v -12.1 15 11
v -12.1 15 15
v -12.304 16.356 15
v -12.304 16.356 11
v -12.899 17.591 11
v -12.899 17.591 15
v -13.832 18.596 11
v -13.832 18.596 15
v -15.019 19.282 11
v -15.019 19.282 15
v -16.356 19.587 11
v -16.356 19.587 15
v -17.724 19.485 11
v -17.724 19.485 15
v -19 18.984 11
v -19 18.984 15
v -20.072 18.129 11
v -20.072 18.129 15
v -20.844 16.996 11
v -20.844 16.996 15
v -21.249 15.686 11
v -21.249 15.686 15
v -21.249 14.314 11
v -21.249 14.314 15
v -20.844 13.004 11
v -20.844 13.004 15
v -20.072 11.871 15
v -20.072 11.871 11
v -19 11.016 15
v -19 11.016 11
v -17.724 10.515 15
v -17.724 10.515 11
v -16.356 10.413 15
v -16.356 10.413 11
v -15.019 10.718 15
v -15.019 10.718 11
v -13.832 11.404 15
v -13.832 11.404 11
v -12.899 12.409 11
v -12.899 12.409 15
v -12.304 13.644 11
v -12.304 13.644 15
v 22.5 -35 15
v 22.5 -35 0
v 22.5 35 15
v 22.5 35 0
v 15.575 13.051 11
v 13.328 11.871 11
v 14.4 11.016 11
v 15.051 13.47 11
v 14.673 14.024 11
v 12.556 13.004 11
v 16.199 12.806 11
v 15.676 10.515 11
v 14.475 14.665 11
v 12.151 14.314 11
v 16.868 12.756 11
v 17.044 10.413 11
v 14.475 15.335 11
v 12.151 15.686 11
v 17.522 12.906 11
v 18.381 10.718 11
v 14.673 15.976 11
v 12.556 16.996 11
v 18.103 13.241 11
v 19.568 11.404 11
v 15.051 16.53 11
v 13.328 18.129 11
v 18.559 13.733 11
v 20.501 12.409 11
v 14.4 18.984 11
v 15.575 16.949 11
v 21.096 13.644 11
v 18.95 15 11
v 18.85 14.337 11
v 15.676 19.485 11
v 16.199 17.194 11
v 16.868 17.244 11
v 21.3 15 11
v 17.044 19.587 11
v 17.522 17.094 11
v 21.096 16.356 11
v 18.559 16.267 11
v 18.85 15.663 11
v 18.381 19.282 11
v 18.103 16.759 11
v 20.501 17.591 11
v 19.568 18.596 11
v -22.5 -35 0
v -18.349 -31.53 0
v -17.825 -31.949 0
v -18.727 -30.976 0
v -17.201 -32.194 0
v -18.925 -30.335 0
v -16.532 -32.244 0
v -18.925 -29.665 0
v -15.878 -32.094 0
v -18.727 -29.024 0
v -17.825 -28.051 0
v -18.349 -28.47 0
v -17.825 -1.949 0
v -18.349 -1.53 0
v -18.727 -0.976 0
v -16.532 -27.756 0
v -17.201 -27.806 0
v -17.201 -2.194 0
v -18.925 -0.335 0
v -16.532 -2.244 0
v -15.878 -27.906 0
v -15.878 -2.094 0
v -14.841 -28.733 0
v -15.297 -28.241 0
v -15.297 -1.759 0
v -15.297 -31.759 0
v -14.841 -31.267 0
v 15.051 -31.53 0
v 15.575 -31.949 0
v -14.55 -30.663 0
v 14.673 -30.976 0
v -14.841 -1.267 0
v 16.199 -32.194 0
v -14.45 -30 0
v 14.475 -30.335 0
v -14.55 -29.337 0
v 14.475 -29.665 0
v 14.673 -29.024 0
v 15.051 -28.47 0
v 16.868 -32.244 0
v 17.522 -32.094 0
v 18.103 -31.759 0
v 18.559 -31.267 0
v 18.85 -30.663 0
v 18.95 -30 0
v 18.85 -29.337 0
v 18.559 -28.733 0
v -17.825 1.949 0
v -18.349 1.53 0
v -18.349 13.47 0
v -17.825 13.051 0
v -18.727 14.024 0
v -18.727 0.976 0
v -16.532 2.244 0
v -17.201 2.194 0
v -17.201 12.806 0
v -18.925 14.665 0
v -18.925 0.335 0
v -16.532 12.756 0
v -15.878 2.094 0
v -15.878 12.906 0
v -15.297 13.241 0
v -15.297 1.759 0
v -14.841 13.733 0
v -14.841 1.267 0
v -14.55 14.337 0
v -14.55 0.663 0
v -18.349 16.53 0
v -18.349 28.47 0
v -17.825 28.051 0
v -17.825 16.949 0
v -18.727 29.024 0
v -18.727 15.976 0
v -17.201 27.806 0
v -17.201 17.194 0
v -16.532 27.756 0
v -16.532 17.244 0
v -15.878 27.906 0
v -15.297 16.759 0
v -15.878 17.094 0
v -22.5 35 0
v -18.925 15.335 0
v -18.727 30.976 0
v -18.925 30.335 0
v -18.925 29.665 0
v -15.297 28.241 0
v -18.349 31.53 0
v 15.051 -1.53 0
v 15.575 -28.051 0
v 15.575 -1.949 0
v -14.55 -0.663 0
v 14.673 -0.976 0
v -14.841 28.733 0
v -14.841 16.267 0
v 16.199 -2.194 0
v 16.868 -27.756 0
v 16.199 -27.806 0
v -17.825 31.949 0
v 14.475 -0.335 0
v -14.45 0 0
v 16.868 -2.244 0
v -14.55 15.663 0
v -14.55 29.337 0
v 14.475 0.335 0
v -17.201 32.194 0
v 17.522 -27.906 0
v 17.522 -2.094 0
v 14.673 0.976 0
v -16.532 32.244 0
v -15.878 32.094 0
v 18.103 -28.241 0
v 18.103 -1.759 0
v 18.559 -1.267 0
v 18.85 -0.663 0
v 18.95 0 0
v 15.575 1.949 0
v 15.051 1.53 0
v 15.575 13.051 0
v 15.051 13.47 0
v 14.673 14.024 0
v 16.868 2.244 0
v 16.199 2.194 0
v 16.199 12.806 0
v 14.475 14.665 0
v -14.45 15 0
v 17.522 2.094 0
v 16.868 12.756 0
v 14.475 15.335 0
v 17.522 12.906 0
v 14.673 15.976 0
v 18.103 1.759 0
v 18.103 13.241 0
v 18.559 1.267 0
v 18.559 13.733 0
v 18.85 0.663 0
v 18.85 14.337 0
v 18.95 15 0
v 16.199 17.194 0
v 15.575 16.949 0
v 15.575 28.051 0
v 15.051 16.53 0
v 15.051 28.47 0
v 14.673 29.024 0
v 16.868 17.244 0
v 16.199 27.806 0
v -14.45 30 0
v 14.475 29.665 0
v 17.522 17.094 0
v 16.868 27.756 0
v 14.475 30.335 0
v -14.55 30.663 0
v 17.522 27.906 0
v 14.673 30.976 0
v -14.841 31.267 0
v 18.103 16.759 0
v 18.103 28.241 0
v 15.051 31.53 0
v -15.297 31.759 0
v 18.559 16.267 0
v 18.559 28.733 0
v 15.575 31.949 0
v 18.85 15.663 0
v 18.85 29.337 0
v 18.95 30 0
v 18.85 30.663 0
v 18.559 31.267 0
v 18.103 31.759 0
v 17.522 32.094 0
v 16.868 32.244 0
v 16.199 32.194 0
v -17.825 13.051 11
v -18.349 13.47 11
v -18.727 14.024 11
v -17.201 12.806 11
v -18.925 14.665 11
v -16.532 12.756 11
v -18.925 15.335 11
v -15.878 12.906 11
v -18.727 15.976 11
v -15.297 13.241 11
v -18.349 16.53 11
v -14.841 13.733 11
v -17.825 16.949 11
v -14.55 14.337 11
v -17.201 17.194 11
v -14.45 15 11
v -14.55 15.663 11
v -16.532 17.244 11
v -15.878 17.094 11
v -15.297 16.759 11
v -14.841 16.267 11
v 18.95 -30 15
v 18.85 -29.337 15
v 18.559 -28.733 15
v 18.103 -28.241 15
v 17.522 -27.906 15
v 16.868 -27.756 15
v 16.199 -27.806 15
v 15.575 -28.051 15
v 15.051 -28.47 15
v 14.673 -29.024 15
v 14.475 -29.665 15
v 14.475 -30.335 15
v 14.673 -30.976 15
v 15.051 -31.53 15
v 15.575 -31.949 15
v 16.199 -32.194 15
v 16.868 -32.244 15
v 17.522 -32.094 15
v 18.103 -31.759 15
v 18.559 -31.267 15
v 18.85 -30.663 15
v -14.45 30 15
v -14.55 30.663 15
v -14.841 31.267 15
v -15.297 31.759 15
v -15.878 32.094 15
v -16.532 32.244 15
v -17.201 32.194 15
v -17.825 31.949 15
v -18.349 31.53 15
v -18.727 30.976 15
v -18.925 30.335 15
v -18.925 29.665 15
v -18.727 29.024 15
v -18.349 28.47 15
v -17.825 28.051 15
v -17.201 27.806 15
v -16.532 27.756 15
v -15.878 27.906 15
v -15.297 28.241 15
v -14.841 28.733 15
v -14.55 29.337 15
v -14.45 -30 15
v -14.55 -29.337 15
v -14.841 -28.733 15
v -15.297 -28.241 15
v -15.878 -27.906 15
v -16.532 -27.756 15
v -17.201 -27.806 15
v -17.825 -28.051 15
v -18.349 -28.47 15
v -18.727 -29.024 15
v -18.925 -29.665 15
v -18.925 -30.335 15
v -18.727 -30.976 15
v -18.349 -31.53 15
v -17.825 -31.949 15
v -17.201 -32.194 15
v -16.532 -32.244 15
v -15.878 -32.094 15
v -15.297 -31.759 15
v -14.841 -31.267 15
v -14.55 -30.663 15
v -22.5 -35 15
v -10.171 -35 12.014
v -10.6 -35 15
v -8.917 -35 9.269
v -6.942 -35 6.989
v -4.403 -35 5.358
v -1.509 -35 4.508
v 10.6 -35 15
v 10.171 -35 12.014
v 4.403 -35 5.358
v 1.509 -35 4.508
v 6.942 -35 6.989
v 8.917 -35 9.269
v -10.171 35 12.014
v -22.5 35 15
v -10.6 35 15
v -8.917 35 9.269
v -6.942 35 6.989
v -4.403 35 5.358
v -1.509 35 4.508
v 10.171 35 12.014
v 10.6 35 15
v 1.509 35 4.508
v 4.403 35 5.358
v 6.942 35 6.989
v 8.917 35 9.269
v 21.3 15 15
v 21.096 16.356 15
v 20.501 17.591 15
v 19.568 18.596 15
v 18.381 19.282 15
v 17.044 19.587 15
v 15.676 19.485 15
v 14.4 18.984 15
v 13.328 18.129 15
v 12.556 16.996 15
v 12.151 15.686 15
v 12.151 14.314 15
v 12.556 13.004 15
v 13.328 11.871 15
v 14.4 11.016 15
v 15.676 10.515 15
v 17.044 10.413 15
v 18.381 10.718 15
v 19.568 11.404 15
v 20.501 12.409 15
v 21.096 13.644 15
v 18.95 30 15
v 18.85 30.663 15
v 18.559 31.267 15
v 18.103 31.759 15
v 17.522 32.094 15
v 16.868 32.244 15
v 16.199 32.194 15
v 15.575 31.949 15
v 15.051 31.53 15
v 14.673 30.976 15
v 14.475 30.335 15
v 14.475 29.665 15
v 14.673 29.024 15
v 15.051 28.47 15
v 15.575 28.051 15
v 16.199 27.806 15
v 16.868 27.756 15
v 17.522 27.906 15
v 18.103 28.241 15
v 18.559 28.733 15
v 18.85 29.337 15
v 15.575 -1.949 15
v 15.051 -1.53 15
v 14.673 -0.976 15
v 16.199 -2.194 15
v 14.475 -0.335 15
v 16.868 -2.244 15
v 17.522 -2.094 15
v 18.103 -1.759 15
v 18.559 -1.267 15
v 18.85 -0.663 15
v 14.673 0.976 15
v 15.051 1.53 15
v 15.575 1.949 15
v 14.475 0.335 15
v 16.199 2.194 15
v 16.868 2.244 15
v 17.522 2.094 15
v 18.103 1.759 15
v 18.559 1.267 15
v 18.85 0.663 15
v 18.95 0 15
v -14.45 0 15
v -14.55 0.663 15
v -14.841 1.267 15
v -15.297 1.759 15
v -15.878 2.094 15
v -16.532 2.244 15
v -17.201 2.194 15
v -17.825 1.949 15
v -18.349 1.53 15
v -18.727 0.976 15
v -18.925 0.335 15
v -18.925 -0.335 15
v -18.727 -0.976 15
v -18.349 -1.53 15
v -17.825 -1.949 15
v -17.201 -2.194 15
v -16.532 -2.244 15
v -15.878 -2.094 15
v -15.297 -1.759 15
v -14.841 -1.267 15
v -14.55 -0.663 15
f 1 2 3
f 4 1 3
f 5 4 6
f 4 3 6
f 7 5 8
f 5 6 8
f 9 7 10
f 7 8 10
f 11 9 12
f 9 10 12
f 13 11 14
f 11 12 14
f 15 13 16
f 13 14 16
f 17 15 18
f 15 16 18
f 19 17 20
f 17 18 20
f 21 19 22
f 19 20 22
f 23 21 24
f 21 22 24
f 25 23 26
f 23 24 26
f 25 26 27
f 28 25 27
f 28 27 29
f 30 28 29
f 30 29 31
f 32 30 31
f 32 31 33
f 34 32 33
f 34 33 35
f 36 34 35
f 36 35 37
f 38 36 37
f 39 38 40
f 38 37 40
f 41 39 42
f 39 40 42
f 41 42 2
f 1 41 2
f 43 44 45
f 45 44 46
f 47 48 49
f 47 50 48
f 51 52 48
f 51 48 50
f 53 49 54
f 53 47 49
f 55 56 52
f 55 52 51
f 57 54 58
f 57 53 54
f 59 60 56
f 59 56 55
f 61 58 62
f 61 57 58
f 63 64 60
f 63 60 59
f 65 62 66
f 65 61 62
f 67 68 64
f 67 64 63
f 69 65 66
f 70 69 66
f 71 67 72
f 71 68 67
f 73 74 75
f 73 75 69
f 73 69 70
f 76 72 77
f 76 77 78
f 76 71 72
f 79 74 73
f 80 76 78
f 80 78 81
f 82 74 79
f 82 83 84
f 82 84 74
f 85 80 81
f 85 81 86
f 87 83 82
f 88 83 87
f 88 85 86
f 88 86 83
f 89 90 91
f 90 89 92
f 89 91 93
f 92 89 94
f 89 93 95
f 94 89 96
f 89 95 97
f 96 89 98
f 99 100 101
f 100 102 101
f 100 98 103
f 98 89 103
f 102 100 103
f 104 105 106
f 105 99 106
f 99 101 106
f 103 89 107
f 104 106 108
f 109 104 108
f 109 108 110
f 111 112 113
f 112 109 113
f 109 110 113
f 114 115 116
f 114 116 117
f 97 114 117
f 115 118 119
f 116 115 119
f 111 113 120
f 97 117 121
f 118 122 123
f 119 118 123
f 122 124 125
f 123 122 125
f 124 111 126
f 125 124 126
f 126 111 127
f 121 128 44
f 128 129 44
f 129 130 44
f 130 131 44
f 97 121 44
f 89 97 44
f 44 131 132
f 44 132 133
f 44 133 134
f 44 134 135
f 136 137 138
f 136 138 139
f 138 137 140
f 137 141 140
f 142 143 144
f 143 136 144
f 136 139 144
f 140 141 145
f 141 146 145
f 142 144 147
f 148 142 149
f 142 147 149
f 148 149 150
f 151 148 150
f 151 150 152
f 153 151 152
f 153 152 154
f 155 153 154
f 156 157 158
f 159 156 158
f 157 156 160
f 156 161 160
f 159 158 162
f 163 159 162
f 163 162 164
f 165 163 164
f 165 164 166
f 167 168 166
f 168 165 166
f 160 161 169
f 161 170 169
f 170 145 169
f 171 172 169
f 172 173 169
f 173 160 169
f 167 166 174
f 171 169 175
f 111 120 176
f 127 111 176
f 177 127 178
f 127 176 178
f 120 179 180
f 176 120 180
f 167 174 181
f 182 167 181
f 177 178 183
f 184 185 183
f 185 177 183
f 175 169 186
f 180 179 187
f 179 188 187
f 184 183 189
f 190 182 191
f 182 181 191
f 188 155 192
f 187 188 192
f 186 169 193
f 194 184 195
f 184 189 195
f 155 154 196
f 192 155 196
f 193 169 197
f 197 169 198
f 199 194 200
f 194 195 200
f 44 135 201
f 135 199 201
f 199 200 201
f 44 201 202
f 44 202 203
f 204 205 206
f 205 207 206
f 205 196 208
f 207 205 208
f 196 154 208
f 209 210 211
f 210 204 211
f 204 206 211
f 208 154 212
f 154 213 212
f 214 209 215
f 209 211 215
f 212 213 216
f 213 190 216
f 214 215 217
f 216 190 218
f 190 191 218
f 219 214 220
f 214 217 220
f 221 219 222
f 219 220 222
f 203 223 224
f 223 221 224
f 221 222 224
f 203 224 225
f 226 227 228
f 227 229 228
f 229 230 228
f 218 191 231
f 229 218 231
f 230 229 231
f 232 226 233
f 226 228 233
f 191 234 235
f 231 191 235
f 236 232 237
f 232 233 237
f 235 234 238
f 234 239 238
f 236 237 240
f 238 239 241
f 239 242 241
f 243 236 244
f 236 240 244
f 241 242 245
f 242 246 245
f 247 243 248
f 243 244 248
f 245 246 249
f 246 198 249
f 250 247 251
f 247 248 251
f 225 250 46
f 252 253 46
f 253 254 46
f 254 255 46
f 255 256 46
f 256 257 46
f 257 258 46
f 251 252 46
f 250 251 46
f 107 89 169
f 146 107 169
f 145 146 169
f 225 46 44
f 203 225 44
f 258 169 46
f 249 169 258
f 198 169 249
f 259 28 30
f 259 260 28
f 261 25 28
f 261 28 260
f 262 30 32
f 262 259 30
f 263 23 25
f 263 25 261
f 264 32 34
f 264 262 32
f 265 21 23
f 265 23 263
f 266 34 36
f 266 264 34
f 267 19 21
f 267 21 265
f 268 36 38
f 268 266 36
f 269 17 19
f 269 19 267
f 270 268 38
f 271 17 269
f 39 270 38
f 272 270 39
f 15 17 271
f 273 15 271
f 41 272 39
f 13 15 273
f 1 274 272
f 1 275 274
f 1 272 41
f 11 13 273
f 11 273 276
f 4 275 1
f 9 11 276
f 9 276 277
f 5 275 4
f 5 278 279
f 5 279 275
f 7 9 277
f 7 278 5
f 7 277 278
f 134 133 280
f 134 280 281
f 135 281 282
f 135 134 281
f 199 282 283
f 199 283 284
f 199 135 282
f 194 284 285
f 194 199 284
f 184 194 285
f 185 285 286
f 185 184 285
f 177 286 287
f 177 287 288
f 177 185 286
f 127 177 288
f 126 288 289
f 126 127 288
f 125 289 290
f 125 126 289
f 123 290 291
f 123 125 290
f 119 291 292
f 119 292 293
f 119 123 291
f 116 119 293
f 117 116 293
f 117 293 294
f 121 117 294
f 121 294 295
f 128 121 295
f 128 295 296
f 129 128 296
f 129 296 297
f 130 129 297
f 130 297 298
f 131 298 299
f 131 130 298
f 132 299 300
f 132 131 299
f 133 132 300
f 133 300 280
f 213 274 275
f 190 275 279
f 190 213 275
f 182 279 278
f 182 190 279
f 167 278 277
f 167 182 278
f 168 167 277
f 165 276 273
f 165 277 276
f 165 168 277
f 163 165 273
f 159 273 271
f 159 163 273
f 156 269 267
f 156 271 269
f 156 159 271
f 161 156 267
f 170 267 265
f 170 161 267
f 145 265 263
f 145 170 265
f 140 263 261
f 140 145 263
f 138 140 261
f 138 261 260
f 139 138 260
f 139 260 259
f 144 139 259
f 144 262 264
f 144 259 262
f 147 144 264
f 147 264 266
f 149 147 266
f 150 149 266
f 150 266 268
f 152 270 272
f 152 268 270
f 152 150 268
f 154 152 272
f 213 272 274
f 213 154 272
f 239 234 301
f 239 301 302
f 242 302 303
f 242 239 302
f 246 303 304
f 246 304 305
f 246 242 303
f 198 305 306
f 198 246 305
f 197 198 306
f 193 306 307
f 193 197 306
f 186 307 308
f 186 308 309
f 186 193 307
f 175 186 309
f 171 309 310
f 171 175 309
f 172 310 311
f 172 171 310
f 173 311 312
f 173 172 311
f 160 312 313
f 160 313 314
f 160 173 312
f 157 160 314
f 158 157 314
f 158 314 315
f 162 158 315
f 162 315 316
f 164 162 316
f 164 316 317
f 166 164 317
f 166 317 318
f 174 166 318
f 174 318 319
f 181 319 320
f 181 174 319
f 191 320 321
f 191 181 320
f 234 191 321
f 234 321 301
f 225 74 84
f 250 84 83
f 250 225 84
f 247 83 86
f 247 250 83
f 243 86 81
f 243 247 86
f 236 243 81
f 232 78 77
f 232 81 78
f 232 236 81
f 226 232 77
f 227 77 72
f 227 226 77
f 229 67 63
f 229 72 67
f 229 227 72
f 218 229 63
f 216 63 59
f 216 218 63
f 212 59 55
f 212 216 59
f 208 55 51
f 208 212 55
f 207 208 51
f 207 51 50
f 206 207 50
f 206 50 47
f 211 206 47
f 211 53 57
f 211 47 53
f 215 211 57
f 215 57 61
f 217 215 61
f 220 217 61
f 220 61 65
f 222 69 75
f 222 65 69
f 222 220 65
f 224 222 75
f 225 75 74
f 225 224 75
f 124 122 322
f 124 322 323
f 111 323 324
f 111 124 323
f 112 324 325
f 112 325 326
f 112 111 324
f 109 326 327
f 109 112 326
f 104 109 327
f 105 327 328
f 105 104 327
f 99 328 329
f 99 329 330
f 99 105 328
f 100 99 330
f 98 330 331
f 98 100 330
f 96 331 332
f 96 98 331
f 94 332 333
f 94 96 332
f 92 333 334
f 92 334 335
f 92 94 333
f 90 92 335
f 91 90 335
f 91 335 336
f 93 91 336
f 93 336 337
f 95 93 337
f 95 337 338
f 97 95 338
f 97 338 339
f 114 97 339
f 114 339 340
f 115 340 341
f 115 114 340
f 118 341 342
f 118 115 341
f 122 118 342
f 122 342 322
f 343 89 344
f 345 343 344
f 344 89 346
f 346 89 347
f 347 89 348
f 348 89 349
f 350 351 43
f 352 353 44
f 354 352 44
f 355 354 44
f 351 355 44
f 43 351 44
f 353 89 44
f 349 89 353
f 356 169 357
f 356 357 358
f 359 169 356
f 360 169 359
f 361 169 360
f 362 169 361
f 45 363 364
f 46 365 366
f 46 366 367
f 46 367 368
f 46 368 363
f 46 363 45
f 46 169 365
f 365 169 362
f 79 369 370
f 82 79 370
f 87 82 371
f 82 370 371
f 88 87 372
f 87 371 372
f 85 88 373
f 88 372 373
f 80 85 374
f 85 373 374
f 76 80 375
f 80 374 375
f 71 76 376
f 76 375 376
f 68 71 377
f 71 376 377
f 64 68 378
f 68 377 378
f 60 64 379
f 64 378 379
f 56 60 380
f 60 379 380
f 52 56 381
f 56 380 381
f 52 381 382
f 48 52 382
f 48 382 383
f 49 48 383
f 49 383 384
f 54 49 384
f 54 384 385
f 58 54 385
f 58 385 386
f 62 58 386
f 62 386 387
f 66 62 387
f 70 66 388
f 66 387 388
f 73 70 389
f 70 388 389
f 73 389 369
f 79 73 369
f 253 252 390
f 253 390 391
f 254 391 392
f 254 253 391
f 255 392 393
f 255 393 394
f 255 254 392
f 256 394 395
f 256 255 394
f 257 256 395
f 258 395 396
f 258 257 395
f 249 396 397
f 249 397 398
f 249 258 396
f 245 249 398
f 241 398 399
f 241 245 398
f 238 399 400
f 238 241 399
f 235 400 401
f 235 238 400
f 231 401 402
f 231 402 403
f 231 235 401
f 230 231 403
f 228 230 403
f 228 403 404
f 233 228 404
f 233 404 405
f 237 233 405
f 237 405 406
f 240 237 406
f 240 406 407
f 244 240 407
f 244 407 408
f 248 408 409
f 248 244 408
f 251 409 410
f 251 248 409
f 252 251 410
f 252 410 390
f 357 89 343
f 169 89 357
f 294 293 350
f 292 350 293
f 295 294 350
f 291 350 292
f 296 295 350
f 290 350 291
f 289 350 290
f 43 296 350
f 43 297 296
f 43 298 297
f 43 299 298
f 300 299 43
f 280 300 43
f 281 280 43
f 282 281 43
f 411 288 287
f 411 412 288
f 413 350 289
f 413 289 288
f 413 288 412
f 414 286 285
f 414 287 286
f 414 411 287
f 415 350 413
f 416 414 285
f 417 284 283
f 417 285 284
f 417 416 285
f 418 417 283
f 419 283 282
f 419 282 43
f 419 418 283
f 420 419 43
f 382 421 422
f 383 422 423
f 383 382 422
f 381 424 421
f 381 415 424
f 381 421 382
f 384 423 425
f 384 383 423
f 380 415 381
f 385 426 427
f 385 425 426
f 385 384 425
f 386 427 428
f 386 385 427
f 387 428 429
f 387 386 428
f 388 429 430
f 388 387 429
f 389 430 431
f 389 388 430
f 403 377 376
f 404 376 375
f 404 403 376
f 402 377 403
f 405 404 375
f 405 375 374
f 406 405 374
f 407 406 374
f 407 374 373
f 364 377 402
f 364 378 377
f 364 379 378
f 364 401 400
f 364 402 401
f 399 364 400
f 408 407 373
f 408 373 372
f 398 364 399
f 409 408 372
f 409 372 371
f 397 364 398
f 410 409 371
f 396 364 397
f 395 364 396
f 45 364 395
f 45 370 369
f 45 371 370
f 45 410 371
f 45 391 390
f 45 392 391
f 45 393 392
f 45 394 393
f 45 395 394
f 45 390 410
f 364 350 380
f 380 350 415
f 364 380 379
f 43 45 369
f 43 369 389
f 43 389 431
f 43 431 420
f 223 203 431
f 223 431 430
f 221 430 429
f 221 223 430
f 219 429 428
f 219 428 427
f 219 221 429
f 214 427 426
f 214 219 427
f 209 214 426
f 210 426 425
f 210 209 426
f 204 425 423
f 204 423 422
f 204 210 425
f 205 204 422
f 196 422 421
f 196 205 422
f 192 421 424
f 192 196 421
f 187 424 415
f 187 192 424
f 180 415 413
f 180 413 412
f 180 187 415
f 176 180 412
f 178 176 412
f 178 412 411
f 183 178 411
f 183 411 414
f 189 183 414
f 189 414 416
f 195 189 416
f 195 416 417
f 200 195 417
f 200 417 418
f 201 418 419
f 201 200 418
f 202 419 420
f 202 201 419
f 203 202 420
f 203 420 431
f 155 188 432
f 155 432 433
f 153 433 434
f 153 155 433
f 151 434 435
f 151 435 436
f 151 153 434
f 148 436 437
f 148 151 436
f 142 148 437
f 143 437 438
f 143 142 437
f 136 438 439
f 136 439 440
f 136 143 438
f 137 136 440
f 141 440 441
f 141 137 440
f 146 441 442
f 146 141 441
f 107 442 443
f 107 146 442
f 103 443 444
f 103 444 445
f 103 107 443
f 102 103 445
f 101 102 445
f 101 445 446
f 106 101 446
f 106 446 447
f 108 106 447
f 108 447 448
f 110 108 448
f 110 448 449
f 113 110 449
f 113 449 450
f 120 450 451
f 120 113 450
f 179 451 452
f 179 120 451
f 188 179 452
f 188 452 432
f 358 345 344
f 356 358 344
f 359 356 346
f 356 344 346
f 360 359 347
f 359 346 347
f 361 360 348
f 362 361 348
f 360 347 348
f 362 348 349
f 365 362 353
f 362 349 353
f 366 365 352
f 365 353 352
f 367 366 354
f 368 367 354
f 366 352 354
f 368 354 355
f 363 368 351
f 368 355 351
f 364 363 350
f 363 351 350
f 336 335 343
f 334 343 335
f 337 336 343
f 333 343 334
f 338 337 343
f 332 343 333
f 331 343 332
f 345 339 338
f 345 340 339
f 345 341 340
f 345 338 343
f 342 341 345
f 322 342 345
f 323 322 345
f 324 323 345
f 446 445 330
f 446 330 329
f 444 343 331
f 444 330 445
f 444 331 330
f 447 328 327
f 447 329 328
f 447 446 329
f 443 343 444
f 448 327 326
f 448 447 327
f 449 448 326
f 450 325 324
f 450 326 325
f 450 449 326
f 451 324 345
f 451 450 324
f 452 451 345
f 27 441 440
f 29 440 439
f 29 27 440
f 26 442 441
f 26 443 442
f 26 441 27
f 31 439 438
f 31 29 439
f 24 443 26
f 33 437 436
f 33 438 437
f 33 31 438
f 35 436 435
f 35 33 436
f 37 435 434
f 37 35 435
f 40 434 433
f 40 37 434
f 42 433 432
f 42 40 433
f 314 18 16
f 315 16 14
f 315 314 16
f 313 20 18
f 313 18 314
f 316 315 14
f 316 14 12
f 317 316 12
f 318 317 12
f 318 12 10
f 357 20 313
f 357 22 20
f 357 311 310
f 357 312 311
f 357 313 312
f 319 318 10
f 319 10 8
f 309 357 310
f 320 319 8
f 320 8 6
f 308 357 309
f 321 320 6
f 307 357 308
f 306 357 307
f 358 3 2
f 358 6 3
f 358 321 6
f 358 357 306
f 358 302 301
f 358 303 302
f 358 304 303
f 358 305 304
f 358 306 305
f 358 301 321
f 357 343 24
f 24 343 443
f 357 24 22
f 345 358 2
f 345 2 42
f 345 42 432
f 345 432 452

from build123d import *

# Parameters (mm, degrees)
SKETCH_W        = 45
SKETCH_H        = 70
SKETCH_R        = 2.25
PAD_DEPTH       = 15
SKETCH001_R     = 10.6
POCKET_DEPTH    = 70.001
SKETCH002_R     = 4.6
POCKET001_DEPTH = 4


with BuildPart() as part:
    # Sketch → Pad (new body)
    with BuildSketch(Plane.XY):
        Rectangle(SKETCH_W, SKETCH_H)
        with Locations((-16.7, 30)):
            Circle(SKETCH_R, mode=Mode.SUBTRACT)
        with Locations((16.7, 30)):
            Circle(SKETCH_R, mode=Mode.SUBTRACT)
        with Locations((-16.7, -30)):
            Circle(SKETCH_R, mode=Mode.SUBTRACT)
        with Locations((16.7, -30)):
            Circle(SKETCH_R, mode=Mode.SUBTRACT)
        with Locations((-16.7, 0)):
            Circle(SKETCH_R, mode=Mode.SUBTRACT)
        with Locations((16.7, 0)):
            Circle(SKETCH_R, mode=Mode.SUBTRACT)
        with Locations((16.7, 15)):
            Circle(SKETCH_R, mode=Mode.SUBTRACT)
        with Locations((-16.7, 15)):
            Circle(SKETCH_R, mode=Mode.SUBTRACT)
    extrude(amount=PAD_DEPTH)

    # Sketch001 → Pocket (cut, through all)
    with BuildSketch(Plane.XZ.offset(35)):
        with Locations((0, 15)):
            Circle(SKETCH001_R)
    extrude(amount=-POCKET_DEPTH, mode=Mode.SUBTRACT)

    # Sketch002 → Pocket001 (cut)
    with BuildSketch(Plane.XY.offset(15)):
        with Locations((-16.7, 15)):
            Circle(SKETCH002_R)
        with Locations((16.7, 15)):
            Circle(SKETCH002_R)
    extrude(amount=-POCKET001_DEPTH, mode=Mode.SUBTRACT)


solid = part.part
